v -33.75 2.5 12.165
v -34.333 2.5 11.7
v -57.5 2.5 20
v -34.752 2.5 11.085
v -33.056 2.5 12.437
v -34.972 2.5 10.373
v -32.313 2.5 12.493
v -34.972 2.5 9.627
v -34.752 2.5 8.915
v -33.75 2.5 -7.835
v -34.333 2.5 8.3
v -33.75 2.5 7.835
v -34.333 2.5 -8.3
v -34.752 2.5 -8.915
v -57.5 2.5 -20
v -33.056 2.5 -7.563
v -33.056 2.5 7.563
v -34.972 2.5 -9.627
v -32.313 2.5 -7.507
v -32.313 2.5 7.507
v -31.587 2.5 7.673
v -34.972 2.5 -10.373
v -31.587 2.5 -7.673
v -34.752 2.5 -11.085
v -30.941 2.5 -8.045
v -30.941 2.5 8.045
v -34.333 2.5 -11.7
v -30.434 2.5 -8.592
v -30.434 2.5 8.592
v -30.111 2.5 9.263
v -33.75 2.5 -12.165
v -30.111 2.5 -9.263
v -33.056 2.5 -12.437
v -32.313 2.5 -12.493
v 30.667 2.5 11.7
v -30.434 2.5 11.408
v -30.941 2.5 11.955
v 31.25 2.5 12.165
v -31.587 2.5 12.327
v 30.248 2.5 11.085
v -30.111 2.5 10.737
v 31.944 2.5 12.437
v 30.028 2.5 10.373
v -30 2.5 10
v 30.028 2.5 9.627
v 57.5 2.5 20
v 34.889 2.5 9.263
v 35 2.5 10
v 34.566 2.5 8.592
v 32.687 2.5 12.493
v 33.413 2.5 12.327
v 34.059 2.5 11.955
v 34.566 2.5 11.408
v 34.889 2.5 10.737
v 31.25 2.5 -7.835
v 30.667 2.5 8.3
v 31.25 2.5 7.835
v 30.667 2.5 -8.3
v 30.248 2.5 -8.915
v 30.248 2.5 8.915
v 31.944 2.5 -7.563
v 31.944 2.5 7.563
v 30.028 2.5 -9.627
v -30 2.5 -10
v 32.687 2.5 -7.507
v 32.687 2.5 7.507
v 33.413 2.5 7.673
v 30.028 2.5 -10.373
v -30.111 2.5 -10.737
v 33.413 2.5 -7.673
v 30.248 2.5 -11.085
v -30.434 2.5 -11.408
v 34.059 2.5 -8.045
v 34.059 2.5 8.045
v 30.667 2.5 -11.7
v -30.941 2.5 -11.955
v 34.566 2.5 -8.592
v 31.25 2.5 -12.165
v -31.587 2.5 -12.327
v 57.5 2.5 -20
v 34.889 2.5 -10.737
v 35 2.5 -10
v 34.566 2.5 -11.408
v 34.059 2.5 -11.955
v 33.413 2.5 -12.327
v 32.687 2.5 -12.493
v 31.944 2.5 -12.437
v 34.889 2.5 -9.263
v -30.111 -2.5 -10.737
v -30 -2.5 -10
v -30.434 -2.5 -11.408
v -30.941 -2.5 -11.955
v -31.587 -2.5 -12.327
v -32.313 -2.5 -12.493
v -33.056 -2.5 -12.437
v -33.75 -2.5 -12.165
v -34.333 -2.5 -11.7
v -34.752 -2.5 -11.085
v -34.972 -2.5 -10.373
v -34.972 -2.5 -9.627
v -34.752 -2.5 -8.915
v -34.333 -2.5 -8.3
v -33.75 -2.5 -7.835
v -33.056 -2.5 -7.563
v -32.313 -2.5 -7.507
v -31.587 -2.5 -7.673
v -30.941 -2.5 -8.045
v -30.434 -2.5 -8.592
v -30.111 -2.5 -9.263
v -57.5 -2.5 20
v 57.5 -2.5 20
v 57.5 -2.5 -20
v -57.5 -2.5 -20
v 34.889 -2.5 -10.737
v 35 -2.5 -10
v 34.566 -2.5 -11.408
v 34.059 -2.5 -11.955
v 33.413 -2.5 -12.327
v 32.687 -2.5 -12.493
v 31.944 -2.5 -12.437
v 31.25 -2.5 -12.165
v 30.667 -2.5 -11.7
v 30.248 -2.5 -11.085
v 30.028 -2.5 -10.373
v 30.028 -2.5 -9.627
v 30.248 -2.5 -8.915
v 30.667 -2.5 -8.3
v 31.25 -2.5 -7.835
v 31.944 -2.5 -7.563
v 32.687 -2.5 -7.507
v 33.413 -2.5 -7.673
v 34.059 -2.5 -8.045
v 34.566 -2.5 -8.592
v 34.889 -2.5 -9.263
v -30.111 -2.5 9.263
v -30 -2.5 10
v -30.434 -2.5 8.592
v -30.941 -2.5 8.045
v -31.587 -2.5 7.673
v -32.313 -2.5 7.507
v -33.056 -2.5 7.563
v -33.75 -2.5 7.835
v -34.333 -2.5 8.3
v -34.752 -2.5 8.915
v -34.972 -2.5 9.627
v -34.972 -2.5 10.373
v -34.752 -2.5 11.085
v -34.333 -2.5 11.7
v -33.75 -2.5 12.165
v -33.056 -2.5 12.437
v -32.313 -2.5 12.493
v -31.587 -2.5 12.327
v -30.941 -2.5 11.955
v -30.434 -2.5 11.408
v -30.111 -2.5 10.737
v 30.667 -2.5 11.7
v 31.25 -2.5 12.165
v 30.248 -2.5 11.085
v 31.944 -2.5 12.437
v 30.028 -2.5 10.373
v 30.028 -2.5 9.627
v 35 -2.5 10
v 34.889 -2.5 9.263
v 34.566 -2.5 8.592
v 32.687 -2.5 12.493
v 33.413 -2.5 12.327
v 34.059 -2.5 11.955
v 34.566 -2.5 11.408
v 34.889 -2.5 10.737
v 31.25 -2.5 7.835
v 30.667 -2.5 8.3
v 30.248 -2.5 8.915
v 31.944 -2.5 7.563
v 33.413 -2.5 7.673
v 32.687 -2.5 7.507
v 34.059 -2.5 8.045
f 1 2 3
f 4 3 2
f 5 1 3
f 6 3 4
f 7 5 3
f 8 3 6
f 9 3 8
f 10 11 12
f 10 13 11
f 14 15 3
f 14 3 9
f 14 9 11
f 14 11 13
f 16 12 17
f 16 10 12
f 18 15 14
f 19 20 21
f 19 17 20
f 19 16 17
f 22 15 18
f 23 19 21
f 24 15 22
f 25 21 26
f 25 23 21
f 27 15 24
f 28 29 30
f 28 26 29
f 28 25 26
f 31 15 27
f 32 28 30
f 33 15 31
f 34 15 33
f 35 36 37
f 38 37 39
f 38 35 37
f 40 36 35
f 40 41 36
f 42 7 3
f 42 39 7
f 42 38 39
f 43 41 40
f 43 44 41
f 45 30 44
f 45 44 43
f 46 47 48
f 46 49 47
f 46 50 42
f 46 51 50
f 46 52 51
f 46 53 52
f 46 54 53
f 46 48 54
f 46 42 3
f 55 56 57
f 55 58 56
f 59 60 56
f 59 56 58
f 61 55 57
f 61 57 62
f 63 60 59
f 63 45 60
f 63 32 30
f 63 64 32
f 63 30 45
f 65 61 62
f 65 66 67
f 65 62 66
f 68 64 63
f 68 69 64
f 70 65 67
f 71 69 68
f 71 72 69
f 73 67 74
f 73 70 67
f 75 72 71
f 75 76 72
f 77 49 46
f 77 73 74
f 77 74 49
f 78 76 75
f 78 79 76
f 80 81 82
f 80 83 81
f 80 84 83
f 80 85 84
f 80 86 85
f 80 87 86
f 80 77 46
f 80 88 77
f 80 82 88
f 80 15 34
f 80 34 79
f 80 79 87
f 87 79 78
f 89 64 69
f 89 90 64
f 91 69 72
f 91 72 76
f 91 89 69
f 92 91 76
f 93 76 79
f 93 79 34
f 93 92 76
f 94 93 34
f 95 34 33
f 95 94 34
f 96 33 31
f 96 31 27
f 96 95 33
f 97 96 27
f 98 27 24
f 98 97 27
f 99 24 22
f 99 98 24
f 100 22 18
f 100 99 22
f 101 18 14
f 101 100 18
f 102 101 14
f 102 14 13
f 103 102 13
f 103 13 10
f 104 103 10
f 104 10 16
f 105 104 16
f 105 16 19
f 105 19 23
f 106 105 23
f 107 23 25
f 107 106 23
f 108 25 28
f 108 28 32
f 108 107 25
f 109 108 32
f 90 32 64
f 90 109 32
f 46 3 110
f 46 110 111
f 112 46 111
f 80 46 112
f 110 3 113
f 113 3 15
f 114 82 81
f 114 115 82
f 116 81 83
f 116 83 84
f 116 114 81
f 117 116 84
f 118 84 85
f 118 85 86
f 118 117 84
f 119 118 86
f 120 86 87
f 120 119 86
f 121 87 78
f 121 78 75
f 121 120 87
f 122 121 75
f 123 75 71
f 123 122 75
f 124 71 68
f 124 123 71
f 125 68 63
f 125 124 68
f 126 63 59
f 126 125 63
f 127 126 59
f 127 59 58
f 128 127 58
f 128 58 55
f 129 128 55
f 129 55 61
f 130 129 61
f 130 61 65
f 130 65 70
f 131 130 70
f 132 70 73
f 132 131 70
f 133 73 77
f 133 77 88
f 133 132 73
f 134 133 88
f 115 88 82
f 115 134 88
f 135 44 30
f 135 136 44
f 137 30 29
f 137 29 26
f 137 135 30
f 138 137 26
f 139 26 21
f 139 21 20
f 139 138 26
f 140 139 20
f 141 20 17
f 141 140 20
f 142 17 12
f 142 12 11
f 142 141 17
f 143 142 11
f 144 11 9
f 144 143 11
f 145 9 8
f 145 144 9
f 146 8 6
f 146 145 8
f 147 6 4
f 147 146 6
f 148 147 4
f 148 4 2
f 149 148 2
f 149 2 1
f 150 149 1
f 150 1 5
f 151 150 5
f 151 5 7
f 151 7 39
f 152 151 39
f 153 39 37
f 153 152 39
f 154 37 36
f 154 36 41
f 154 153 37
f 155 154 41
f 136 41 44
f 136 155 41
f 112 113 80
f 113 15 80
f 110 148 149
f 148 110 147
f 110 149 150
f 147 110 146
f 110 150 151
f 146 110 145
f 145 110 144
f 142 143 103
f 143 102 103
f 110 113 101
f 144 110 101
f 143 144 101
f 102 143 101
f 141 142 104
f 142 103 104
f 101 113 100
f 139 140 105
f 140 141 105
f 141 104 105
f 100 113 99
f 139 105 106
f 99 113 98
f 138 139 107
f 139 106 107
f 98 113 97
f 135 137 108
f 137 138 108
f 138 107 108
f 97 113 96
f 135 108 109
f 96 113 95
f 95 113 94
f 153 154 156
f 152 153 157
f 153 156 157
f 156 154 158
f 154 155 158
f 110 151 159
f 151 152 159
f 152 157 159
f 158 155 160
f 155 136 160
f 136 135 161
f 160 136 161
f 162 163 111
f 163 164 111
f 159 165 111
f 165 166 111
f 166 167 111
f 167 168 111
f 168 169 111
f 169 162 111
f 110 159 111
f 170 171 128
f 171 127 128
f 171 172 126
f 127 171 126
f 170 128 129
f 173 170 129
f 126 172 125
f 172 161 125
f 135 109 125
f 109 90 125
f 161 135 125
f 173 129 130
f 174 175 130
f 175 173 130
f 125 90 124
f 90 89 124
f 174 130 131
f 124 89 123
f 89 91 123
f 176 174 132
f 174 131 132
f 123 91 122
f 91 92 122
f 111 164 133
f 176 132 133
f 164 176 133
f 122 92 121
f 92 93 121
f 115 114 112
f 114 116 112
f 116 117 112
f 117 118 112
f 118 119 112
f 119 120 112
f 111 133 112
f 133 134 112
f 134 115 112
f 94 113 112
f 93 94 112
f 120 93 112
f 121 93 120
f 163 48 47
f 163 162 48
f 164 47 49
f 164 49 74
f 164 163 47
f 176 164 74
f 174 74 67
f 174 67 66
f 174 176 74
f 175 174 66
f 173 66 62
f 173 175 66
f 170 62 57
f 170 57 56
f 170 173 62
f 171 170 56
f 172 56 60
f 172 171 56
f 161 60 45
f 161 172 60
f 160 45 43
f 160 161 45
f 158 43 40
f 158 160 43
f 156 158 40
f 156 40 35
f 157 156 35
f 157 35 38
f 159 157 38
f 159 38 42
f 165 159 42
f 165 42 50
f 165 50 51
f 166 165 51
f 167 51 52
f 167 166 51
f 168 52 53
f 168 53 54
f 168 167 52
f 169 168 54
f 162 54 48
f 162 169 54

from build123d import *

# Parameters (mm, degrees)
SKETCH2_W           = 115
SKETCH2_H           = 40
SKETCH2_R           = 2.5
BOSS_EXTRUDE1_DEPTH = 2.5


with BuildPart() as part:
    # Sketch2 → Boss-Extrude1 (new body, symmetric)
    with BuildSketch(Plane(origin=(0, 0, 0), x_dir=(1, 0, 0), z_dir=(0, 1, 0))):
        Rectangle(SKETCH2_W, SKETCH2_H)
        with Locations((-32.5, 10)):
            Circle(SKETCH2_R, mode=Mode.SUBTRACT)
        with Locations((32.5, 10)):
            Circle(SKETCH2_R, mode=Mode.SUBTRACT)
        with Locations((32.5, -10)):
            Circle(SKETCH2_R, mode=Mode.SUBTRACT)
        with Locations((-32.5, -10)):
            Circle(SKETCH2_R, mode=Mode.SUBTRACT)
    extrude(amount=BOSS_EXTRUDE1_DEPTH, both=True)


solid = part.part
